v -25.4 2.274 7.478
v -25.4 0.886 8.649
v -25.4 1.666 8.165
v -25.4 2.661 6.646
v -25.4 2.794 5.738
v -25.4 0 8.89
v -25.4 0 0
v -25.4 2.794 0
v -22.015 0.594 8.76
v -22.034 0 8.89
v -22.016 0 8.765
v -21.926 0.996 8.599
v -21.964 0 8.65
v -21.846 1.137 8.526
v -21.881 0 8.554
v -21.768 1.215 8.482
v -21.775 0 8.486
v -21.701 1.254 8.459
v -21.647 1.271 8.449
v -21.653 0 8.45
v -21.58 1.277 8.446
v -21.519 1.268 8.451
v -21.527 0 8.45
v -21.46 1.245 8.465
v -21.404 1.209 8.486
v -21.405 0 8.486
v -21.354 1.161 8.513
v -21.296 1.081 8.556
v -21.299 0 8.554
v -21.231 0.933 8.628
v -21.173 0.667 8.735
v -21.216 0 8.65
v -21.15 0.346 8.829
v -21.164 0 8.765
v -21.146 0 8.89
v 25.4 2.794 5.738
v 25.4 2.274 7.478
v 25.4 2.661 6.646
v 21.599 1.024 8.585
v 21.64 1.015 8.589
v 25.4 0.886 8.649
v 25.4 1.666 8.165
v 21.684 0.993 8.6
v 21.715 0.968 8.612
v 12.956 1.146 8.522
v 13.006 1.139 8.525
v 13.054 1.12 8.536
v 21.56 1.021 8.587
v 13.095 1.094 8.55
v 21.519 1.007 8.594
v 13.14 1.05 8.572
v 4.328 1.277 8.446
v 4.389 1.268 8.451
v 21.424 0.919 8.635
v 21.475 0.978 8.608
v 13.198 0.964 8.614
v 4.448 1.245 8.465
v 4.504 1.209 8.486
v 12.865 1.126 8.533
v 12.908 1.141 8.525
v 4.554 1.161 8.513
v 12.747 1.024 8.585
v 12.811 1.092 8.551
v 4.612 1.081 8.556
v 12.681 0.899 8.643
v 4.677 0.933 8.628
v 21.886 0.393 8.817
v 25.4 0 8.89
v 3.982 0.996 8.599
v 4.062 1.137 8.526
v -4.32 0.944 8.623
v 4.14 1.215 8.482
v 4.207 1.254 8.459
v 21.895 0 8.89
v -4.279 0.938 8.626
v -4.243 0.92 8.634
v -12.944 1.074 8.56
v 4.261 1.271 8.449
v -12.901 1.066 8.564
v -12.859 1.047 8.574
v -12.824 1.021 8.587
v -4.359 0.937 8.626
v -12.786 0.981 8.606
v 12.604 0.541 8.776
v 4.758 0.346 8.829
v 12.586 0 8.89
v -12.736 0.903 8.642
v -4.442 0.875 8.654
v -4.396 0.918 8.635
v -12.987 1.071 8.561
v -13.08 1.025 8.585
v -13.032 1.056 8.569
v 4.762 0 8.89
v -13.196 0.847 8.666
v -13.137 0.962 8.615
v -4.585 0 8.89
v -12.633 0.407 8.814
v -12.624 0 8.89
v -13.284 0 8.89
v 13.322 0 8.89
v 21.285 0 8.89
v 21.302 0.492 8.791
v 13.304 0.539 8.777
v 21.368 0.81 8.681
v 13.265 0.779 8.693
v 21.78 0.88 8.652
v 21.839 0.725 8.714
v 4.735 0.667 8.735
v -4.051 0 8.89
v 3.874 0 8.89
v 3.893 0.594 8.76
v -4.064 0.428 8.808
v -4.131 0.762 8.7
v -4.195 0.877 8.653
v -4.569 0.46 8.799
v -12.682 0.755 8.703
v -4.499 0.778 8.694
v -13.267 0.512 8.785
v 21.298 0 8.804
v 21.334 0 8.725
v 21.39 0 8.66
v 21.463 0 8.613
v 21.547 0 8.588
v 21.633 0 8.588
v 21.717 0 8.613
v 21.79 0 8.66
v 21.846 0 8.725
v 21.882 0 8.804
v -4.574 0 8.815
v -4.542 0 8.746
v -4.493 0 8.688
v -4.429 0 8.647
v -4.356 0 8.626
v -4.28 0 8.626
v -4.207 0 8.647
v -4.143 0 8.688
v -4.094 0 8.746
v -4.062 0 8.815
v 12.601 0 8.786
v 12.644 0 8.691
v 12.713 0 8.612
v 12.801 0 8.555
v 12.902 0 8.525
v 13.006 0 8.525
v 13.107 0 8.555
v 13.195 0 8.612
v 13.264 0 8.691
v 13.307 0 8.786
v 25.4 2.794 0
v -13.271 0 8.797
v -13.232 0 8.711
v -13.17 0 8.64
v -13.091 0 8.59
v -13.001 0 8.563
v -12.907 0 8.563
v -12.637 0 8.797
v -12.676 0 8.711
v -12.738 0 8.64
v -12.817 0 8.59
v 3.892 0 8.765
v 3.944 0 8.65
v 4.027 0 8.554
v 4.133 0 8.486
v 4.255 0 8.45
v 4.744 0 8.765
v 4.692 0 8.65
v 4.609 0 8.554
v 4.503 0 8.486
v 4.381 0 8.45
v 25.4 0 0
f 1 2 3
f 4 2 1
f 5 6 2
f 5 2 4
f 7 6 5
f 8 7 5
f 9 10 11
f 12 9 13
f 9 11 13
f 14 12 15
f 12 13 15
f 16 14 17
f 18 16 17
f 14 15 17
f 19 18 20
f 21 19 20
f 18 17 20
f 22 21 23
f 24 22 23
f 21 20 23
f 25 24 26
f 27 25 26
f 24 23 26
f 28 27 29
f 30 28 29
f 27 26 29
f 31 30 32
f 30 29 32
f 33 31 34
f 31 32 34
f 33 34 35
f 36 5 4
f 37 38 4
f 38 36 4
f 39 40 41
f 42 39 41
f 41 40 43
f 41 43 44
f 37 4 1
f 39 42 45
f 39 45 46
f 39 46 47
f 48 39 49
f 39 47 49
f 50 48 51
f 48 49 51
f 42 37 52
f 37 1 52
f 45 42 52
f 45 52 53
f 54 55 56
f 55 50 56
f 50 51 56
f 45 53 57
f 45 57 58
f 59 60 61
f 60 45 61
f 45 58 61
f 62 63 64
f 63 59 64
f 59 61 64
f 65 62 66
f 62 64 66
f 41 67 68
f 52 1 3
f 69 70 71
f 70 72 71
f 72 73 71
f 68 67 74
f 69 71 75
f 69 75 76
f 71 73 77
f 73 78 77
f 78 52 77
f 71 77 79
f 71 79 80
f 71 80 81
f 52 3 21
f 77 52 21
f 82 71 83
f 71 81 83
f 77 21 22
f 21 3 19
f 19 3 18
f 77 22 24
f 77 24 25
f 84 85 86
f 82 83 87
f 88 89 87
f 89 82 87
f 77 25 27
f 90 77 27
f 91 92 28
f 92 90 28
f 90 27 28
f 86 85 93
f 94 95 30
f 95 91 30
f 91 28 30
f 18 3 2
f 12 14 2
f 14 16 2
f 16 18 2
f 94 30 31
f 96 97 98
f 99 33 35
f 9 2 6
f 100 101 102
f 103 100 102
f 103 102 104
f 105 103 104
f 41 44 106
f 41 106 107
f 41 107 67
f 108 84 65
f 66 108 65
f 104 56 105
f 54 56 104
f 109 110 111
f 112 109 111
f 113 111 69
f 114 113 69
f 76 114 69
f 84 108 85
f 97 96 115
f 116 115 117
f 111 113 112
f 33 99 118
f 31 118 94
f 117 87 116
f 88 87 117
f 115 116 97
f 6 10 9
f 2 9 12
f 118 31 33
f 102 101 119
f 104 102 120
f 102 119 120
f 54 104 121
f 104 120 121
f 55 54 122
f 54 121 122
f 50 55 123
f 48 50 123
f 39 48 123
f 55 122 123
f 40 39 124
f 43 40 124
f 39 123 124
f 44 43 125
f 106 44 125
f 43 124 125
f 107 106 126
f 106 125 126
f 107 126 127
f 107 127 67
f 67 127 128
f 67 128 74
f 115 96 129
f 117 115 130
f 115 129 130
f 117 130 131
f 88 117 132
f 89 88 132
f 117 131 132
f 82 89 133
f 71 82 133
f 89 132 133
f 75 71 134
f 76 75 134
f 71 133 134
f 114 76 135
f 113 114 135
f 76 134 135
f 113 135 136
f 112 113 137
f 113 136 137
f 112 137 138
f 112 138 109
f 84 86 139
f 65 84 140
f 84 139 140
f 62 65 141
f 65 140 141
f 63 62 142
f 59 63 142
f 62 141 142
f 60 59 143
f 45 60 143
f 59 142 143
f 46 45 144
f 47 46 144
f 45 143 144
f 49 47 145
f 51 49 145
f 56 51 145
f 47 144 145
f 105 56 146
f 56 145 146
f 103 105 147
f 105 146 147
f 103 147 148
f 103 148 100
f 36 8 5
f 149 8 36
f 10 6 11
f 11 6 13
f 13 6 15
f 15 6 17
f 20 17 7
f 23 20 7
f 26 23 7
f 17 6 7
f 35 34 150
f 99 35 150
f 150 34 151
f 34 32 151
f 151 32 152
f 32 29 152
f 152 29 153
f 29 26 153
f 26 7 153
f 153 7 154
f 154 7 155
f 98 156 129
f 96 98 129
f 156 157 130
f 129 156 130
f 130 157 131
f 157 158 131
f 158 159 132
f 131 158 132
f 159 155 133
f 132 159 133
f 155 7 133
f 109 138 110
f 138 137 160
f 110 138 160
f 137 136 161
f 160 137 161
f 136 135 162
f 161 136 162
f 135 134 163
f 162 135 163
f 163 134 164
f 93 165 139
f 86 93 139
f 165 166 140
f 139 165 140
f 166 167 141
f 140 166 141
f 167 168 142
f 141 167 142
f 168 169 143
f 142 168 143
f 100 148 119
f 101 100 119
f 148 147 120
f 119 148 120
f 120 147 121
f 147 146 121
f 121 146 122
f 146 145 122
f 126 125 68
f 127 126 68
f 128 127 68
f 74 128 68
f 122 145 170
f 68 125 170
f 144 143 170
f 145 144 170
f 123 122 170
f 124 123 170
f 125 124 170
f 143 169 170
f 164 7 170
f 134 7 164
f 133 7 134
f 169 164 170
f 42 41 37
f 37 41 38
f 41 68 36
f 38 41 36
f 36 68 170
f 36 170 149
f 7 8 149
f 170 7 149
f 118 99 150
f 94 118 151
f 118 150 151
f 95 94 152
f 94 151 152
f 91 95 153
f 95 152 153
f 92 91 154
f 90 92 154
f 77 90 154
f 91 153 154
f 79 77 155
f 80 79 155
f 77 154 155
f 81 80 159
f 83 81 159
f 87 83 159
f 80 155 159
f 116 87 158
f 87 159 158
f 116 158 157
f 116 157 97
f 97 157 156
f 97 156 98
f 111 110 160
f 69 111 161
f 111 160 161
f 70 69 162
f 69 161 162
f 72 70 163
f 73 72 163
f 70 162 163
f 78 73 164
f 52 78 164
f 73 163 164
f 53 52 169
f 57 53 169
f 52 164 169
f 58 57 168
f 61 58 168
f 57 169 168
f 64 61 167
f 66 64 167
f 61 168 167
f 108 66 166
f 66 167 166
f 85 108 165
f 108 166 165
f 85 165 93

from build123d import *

# Parameters (mm, degrees)
F0_W        = 50.8
F0_H        = 2.794
F1_DEPTH    = 8.89
F2_T1_DEPTH = 66.5602855304
F4_DEPTH    = 25.4


# Not quite as in the source:
# - a fillet or chamfer that OpenCascade refuses, or shapes differently, is made with other operations: its cross-section is extruded or revolved along the edge and cut away or added


with BuildPart() as f1:
    # F0 (on Top) → F1 (new body)
    with BuildSketch(Plane.XY):
        with Locations((0, 1.397)):
            Rectangle(F0_W, F0_H)
    extrude(amount=F1_DEPTH)

    # F2: fillet of radius 3.175 on 1 edges, made by hand

    # F2_s2 → F2_t1 (cut)
    with BuildSketch(Plane.YZ.offset(-33.2801427652)):
        with BuildLine():
            ThreePointArc((2.794, 5.7379428939), (1.9949524406, 7.8439996358), (0, 8.89))
            Line((0, 8.89), (2.794, 8.89))
            Line((2.794, 8.89), (2.794, 5.7379428939))
        make_face()
    extrude(amount=F2_T1_DEPTH, mode=Mode.SUBTRACT)

    # F3 (on face) → F4 (cut)
    with BuildSketch(Plane.XZ):
        with BuildLine():
            ThreePointArc((-22.0345, 8.89), (-21.59, 8.4455), (-21.1455, 8.89))
            Line((-21.1455, 8.89), (-22.0345, 8.89))
        make_face()
        with BuildLine():
            Line((-12.6238, 8.89), (-13.2842, 8.89))
            ThreePointArc((-13.2842, 8.89), (-12.954, 8.5598), (-12.6238, 8.89))
        make_face()
        with BuildLine():
            Line((13.3223, 8.89), (12.5857, 8.89))
            ThreePointArc((12.5857, 8.89), (12.954, 8.5217), (13.3223, 8.89))
        make_face()
        with BuildLine():
            ThreePointArc((21.2852, 8.89), (21.59, 8.5852), (21.8948, 8.89))
            Line((21.8948, 8.89), (21.2852, 8.89))
        make_face()
        with BuildLine():
            Line((-4.0513, 8.89), (-4.5847, 8.89))
            ThreePointArc((-4.5847, 8.89), (-4.318, 8.6233), (-4.0513, 8.89))
        make_face()
        with BuildLine():
            Line((4.7625, 8.89), (3.8735, 8.89))
            ThreePointArc((3.8735, 8.89), (4.318, 8.4455), (4.7625, 8.89))
        make_face()
    extrude(amount=-F4_DEPTH, mode=Mode.SUBTRACT)


solid = f1.part
